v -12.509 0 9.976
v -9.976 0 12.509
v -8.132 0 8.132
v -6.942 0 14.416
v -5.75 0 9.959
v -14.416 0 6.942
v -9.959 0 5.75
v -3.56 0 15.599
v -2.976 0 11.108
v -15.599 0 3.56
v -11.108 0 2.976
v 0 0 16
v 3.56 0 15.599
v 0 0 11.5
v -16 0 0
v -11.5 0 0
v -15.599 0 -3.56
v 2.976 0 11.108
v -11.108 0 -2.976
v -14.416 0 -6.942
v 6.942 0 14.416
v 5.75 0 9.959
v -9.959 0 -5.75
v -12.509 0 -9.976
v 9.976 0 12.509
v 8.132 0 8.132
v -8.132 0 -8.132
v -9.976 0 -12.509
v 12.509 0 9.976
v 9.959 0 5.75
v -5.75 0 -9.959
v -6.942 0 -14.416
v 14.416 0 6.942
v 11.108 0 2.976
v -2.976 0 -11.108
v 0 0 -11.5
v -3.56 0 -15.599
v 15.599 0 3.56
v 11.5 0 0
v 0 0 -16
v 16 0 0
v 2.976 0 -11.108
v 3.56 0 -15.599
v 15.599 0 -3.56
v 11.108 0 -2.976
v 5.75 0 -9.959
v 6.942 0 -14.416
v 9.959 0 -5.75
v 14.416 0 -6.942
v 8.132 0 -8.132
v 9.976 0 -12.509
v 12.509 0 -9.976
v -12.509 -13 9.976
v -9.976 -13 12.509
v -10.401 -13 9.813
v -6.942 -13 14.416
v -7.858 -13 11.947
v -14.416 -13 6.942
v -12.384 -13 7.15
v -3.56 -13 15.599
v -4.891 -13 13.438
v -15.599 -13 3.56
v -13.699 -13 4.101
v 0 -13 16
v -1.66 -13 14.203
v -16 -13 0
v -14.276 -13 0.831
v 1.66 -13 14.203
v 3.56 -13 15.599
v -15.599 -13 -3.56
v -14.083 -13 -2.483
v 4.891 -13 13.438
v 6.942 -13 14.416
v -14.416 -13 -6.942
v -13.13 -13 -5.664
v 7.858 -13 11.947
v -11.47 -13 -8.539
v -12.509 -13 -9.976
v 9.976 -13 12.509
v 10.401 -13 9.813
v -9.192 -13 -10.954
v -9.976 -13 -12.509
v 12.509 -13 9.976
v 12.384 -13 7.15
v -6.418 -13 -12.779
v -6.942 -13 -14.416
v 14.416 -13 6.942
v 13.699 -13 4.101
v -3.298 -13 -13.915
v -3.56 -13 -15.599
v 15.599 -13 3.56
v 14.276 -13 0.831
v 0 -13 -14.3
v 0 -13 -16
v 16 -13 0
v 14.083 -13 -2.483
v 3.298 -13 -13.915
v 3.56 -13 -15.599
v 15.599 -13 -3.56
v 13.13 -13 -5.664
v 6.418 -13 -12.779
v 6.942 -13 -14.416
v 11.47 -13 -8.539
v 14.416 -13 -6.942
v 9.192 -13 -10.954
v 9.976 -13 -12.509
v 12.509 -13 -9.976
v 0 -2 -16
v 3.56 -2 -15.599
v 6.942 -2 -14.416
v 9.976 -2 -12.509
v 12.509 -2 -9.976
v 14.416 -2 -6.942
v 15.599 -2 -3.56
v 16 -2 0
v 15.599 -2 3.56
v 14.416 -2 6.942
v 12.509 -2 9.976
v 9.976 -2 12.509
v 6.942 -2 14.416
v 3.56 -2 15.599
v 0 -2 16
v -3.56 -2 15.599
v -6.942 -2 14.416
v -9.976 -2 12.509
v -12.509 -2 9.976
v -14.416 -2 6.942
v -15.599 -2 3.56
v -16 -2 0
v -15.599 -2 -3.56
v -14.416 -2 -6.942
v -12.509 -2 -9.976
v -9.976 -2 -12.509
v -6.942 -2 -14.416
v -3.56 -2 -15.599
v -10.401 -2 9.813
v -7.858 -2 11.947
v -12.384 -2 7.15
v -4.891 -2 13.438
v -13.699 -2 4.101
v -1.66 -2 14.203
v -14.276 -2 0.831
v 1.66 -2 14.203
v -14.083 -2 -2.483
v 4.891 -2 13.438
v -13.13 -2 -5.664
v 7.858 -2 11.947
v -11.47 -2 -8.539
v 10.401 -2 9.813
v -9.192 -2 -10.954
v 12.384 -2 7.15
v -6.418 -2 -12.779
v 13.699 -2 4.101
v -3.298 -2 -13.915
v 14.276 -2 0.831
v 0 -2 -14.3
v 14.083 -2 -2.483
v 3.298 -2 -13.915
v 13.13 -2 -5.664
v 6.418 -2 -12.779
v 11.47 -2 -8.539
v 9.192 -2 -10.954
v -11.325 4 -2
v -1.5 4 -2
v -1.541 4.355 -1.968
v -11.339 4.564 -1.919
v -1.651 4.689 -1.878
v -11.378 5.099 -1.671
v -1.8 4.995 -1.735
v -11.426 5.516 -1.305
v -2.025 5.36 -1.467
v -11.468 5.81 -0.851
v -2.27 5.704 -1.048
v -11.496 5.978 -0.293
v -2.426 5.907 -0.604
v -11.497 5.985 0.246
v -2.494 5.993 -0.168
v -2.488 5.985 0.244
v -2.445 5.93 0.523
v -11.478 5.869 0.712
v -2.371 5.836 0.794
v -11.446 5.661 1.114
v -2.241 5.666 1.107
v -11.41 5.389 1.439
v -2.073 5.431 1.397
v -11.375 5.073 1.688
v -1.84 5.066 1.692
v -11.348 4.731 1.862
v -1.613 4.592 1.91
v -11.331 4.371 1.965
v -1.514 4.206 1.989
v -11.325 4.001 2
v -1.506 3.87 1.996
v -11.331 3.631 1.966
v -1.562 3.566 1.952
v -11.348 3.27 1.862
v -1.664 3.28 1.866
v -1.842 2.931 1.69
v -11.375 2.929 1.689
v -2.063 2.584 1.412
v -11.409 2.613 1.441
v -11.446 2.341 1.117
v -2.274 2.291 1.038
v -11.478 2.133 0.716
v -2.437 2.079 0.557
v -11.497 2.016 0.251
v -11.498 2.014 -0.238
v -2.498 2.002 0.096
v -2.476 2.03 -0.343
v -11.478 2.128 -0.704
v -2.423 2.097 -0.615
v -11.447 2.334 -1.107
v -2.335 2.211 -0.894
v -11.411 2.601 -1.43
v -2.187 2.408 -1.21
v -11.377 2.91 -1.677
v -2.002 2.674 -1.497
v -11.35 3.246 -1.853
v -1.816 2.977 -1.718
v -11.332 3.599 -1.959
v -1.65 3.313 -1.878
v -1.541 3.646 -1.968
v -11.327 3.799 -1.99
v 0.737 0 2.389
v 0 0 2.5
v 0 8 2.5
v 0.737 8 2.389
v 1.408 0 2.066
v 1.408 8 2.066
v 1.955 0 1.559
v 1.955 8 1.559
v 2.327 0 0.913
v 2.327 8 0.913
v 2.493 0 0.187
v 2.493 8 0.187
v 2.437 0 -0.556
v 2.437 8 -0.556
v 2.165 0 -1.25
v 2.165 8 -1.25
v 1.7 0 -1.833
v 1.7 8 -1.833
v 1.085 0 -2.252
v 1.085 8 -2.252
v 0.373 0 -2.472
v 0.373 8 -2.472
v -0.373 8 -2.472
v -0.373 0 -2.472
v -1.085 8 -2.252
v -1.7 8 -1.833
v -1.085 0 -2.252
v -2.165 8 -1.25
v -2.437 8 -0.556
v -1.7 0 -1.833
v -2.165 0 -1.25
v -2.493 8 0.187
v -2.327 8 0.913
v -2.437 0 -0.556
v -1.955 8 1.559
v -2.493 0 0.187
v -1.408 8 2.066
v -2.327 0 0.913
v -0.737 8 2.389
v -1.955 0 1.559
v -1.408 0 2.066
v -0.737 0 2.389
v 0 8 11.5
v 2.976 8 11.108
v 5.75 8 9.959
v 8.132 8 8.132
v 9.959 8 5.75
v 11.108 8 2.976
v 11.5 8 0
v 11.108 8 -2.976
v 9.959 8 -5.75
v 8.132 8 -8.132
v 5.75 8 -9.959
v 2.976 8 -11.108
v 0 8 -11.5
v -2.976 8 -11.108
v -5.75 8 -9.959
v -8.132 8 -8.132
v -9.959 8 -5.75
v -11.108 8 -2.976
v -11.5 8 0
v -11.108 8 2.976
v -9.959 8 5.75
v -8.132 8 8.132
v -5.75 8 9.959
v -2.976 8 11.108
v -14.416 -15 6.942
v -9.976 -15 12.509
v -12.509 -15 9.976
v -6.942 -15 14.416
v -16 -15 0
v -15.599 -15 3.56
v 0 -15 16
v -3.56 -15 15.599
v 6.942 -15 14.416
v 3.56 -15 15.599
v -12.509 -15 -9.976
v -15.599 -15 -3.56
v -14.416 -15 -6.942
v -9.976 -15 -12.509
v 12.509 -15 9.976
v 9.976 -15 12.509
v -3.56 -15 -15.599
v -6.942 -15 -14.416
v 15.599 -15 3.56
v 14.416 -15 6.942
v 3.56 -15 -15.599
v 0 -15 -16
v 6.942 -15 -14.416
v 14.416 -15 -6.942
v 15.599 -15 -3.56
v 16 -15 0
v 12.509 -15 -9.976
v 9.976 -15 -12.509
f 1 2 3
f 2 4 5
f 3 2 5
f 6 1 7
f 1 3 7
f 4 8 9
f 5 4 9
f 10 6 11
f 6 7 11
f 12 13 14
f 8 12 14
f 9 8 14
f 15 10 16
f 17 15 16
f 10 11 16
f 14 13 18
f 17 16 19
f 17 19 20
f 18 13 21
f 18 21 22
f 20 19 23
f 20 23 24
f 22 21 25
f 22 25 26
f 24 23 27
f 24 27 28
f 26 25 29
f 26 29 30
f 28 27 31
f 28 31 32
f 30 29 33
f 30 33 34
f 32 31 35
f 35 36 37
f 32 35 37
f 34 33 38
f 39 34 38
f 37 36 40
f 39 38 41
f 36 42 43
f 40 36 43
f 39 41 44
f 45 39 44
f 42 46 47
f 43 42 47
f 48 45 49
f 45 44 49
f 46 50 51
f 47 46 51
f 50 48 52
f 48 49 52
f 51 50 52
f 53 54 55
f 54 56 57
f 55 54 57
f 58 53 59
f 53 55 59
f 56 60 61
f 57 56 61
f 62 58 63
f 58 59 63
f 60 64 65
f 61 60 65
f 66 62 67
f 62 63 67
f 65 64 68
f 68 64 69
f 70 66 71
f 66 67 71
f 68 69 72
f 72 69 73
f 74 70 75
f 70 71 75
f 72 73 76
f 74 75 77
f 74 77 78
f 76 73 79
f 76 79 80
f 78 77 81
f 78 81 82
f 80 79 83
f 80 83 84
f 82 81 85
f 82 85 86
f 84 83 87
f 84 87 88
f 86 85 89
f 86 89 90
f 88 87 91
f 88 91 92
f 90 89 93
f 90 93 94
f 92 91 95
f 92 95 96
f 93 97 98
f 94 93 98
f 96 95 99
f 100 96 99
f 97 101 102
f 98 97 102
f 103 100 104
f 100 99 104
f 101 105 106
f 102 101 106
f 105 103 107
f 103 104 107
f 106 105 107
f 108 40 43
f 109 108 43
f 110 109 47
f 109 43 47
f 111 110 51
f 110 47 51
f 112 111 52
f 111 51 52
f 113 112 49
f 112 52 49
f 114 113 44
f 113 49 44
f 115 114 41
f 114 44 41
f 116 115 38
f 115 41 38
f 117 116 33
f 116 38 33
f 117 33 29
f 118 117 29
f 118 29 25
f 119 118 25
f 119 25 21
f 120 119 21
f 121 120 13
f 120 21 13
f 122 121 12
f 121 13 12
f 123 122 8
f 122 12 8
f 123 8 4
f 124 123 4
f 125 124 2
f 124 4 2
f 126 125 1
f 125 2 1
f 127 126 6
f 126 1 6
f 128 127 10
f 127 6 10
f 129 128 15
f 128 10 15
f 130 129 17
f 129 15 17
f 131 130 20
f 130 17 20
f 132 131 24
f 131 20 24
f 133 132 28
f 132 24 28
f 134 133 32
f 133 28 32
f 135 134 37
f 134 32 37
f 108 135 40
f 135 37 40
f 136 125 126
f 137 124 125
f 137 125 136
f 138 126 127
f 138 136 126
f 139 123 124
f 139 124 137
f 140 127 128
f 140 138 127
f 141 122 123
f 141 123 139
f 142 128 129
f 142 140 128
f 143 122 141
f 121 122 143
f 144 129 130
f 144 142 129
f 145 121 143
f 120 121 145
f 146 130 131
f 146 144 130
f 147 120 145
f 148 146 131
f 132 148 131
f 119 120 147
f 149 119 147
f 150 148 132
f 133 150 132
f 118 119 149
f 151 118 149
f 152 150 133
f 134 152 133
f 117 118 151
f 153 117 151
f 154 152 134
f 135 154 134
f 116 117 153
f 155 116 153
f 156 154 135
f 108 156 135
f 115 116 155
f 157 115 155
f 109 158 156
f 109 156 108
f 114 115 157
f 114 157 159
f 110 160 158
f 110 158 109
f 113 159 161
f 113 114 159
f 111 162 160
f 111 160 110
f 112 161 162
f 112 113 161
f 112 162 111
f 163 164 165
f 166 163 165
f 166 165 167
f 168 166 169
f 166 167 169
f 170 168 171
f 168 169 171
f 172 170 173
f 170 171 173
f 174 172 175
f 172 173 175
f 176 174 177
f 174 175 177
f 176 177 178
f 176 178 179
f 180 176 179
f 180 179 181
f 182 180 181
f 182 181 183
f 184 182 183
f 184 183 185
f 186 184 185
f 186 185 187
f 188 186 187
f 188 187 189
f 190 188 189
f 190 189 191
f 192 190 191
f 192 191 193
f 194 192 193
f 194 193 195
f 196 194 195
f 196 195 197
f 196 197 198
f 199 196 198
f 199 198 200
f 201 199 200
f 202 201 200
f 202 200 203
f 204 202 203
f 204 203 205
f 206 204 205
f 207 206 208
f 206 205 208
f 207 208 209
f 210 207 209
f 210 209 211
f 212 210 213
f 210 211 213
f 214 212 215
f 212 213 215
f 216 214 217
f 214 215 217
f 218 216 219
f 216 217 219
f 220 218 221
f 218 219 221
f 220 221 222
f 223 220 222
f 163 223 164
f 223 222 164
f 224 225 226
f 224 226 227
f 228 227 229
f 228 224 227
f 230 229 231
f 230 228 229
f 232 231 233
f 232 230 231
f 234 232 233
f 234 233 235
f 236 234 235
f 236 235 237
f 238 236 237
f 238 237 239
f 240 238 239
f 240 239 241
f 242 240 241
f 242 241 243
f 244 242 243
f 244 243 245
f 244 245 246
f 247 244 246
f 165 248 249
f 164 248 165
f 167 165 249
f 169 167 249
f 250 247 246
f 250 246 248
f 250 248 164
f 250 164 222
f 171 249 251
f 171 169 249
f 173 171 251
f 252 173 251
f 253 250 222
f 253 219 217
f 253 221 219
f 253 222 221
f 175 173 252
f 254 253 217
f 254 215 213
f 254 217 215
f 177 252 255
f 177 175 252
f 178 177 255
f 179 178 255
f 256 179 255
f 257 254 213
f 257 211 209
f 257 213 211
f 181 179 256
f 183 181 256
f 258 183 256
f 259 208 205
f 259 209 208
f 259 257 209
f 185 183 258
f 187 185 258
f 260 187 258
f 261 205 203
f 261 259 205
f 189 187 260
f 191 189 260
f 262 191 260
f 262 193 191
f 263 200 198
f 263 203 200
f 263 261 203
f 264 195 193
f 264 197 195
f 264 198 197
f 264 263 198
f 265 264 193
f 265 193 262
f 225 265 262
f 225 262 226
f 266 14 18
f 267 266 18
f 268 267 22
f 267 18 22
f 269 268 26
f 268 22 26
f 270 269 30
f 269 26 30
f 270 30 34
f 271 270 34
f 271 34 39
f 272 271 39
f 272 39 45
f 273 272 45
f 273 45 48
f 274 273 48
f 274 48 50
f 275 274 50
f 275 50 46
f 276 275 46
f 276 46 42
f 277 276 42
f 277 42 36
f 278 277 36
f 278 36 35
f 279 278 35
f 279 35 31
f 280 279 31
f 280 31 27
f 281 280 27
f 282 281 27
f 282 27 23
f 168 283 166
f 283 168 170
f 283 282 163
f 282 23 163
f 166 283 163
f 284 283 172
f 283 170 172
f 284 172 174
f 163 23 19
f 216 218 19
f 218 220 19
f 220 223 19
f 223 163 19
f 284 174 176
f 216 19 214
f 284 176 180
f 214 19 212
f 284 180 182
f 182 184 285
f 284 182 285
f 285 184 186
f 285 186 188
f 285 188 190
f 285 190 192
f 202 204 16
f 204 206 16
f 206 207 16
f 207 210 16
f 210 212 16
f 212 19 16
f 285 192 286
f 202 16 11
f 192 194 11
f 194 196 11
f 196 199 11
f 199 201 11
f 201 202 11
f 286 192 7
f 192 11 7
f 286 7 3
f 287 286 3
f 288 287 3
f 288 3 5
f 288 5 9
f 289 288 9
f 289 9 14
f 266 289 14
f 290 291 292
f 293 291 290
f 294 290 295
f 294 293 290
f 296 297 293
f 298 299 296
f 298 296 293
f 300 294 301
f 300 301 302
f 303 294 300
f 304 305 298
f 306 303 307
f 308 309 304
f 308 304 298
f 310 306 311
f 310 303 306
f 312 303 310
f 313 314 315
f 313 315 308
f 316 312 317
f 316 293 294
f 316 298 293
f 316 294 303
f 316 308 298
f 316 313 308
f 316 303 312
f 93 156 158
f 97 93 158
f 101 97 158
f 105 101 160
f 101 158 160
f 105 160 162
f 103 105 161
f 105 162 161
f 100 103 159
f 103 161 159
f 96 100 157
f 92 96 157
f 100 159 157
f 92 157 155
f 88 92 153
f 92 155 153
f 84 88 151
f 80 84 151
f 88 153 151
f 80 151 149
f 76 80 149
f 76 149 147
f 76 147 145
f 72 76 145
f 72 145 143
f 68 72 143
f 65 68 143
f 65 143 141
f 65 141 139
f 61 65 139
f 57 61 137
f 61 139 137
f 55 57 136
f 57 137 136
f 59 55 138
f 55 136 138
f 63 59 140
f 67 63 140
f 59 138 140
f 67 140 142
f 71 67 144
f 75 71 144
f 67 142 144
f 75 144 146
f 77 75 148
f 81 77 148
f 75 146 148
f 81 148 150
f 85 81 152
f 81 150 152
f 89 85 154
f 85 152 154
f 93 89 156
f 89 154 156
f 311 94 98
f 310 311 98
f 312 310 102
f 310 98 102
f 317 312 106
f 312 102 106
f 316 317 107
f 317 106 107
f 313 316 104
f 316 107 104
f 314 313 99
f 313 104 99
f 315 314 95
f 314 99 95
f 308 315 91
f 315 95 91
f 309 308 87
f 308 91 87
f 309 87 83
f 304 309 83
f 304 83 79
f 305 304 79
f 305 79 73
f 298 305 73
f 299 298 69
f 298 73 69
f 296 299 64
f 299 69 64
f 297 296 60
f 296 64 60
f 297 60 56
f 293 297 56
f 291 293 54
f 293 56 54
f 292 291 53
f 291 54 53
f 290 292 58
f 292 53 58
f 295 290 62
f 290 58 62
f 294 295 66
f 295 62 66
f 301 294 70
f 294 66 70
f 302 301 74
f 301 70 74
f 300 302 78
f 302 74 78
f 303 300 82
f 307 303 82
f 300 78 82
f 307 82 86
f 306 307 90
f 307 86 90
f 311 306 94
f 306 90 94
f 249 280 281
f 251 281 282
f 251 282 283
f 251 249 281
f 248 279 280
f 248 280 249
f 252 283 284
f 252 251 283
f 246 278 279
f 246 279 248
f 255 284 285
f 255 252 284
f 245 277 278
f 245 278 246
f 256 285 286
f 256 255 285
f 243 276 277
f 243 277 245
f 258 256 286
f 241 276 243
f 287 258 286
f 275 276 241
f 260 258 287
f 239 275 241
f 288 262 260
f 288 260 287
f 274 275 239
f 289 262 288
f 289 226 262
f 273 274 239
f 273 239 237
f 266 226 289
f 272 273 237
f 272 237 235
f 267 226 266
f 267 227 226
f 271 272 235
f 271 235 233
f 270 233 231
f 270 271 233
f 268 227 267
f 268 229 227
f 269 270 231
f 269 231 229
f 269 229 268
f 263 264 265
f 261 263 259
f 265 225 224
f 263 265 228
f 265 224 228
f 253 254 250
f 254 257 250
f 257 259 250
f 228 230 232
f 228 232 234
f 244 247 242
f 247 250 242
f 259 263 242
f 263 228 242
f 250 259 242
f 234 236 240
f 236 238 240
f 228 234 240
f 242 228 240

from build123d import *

# Parameters (mm, degrees)
SKETCH_1_R          = 11.5
SKETCH_1_R_2        = 2.5
EXTRUDE_1_DEPTH     = 8
SKETCH_2_R          = 16
EXTRUDE_2_DEPTH     = 2
SKETCH_3_R          = 14.3
EXTRUDE_3_DEPTH     = 11
SKETCH_4_R          = 16
EXTRUDE_4_DEPTH     = 2
SKETCH_5_R          = 2
CUT_EXTRUDE_1_DEPTH = 19


with BuildPart() as part:
    # 草图1 → 凸台-拉伸1 (new body)
    with BuildSketch(Plane(origin=(0, 0, 0), x_dir=(1, 0, 0), z_dir=(0, 1, 0))):
        with Locations(Location((0, 0, 0), (0, 0, 270))):
            Circle(SKETCH_1_R)
        with Locations(Location((0, 0, 0), (0, 0, 270))):
            Circle(SKETCH_1_R_2, mode=Mode.SUBTRACT)
    extrude(amount=EXTRUDE_1_DEPTH)

    # 草图2 → 凸台-拉伸2 (add)
    with BuildSketch(Plane.XZ):
        with Locations(Location((0, 0, 0), (0, 0, 270))):
            Circle(SKETCH_2_R)
    extrude(amount=EXTRUDE_2_DEPTH)

    # 草图3 → 凸台-拉伸3 (add)
    with BuildSketch(Plane.XZ.offset(2)):
        with Locations(Location((0, 0, 0), (0, 0, 270))):
            Circle(SKETCH_3_R)
    extrude(amount=EXTRUDE_3_DEPTH)

    # 草图4 → 凸台-拉伸4 (add)
    with BuildSketch(Plane.XZ.offset(13)):
        with Locations(Location((0, 0, 0), (0, 0, 270))):
            Circle(SKETCH_4_R)
    extrude(amount=EXTRUDE_4_DEPTH)

    # 草图5 → 切除-拉伸1 (cut)
    with BuildSketch(Plane(origin=(0, 0, 0), x_dir=(0, 0, -1), z_dir=(1, 0, 0))):
        with Locations((0, 4)):
            Circle(SKETCH_5_R)
    extrude(amount=-CUT_EXTRUDE_1_DEPTH, mode=Mode.SUBTRACT)


solid = part.part
